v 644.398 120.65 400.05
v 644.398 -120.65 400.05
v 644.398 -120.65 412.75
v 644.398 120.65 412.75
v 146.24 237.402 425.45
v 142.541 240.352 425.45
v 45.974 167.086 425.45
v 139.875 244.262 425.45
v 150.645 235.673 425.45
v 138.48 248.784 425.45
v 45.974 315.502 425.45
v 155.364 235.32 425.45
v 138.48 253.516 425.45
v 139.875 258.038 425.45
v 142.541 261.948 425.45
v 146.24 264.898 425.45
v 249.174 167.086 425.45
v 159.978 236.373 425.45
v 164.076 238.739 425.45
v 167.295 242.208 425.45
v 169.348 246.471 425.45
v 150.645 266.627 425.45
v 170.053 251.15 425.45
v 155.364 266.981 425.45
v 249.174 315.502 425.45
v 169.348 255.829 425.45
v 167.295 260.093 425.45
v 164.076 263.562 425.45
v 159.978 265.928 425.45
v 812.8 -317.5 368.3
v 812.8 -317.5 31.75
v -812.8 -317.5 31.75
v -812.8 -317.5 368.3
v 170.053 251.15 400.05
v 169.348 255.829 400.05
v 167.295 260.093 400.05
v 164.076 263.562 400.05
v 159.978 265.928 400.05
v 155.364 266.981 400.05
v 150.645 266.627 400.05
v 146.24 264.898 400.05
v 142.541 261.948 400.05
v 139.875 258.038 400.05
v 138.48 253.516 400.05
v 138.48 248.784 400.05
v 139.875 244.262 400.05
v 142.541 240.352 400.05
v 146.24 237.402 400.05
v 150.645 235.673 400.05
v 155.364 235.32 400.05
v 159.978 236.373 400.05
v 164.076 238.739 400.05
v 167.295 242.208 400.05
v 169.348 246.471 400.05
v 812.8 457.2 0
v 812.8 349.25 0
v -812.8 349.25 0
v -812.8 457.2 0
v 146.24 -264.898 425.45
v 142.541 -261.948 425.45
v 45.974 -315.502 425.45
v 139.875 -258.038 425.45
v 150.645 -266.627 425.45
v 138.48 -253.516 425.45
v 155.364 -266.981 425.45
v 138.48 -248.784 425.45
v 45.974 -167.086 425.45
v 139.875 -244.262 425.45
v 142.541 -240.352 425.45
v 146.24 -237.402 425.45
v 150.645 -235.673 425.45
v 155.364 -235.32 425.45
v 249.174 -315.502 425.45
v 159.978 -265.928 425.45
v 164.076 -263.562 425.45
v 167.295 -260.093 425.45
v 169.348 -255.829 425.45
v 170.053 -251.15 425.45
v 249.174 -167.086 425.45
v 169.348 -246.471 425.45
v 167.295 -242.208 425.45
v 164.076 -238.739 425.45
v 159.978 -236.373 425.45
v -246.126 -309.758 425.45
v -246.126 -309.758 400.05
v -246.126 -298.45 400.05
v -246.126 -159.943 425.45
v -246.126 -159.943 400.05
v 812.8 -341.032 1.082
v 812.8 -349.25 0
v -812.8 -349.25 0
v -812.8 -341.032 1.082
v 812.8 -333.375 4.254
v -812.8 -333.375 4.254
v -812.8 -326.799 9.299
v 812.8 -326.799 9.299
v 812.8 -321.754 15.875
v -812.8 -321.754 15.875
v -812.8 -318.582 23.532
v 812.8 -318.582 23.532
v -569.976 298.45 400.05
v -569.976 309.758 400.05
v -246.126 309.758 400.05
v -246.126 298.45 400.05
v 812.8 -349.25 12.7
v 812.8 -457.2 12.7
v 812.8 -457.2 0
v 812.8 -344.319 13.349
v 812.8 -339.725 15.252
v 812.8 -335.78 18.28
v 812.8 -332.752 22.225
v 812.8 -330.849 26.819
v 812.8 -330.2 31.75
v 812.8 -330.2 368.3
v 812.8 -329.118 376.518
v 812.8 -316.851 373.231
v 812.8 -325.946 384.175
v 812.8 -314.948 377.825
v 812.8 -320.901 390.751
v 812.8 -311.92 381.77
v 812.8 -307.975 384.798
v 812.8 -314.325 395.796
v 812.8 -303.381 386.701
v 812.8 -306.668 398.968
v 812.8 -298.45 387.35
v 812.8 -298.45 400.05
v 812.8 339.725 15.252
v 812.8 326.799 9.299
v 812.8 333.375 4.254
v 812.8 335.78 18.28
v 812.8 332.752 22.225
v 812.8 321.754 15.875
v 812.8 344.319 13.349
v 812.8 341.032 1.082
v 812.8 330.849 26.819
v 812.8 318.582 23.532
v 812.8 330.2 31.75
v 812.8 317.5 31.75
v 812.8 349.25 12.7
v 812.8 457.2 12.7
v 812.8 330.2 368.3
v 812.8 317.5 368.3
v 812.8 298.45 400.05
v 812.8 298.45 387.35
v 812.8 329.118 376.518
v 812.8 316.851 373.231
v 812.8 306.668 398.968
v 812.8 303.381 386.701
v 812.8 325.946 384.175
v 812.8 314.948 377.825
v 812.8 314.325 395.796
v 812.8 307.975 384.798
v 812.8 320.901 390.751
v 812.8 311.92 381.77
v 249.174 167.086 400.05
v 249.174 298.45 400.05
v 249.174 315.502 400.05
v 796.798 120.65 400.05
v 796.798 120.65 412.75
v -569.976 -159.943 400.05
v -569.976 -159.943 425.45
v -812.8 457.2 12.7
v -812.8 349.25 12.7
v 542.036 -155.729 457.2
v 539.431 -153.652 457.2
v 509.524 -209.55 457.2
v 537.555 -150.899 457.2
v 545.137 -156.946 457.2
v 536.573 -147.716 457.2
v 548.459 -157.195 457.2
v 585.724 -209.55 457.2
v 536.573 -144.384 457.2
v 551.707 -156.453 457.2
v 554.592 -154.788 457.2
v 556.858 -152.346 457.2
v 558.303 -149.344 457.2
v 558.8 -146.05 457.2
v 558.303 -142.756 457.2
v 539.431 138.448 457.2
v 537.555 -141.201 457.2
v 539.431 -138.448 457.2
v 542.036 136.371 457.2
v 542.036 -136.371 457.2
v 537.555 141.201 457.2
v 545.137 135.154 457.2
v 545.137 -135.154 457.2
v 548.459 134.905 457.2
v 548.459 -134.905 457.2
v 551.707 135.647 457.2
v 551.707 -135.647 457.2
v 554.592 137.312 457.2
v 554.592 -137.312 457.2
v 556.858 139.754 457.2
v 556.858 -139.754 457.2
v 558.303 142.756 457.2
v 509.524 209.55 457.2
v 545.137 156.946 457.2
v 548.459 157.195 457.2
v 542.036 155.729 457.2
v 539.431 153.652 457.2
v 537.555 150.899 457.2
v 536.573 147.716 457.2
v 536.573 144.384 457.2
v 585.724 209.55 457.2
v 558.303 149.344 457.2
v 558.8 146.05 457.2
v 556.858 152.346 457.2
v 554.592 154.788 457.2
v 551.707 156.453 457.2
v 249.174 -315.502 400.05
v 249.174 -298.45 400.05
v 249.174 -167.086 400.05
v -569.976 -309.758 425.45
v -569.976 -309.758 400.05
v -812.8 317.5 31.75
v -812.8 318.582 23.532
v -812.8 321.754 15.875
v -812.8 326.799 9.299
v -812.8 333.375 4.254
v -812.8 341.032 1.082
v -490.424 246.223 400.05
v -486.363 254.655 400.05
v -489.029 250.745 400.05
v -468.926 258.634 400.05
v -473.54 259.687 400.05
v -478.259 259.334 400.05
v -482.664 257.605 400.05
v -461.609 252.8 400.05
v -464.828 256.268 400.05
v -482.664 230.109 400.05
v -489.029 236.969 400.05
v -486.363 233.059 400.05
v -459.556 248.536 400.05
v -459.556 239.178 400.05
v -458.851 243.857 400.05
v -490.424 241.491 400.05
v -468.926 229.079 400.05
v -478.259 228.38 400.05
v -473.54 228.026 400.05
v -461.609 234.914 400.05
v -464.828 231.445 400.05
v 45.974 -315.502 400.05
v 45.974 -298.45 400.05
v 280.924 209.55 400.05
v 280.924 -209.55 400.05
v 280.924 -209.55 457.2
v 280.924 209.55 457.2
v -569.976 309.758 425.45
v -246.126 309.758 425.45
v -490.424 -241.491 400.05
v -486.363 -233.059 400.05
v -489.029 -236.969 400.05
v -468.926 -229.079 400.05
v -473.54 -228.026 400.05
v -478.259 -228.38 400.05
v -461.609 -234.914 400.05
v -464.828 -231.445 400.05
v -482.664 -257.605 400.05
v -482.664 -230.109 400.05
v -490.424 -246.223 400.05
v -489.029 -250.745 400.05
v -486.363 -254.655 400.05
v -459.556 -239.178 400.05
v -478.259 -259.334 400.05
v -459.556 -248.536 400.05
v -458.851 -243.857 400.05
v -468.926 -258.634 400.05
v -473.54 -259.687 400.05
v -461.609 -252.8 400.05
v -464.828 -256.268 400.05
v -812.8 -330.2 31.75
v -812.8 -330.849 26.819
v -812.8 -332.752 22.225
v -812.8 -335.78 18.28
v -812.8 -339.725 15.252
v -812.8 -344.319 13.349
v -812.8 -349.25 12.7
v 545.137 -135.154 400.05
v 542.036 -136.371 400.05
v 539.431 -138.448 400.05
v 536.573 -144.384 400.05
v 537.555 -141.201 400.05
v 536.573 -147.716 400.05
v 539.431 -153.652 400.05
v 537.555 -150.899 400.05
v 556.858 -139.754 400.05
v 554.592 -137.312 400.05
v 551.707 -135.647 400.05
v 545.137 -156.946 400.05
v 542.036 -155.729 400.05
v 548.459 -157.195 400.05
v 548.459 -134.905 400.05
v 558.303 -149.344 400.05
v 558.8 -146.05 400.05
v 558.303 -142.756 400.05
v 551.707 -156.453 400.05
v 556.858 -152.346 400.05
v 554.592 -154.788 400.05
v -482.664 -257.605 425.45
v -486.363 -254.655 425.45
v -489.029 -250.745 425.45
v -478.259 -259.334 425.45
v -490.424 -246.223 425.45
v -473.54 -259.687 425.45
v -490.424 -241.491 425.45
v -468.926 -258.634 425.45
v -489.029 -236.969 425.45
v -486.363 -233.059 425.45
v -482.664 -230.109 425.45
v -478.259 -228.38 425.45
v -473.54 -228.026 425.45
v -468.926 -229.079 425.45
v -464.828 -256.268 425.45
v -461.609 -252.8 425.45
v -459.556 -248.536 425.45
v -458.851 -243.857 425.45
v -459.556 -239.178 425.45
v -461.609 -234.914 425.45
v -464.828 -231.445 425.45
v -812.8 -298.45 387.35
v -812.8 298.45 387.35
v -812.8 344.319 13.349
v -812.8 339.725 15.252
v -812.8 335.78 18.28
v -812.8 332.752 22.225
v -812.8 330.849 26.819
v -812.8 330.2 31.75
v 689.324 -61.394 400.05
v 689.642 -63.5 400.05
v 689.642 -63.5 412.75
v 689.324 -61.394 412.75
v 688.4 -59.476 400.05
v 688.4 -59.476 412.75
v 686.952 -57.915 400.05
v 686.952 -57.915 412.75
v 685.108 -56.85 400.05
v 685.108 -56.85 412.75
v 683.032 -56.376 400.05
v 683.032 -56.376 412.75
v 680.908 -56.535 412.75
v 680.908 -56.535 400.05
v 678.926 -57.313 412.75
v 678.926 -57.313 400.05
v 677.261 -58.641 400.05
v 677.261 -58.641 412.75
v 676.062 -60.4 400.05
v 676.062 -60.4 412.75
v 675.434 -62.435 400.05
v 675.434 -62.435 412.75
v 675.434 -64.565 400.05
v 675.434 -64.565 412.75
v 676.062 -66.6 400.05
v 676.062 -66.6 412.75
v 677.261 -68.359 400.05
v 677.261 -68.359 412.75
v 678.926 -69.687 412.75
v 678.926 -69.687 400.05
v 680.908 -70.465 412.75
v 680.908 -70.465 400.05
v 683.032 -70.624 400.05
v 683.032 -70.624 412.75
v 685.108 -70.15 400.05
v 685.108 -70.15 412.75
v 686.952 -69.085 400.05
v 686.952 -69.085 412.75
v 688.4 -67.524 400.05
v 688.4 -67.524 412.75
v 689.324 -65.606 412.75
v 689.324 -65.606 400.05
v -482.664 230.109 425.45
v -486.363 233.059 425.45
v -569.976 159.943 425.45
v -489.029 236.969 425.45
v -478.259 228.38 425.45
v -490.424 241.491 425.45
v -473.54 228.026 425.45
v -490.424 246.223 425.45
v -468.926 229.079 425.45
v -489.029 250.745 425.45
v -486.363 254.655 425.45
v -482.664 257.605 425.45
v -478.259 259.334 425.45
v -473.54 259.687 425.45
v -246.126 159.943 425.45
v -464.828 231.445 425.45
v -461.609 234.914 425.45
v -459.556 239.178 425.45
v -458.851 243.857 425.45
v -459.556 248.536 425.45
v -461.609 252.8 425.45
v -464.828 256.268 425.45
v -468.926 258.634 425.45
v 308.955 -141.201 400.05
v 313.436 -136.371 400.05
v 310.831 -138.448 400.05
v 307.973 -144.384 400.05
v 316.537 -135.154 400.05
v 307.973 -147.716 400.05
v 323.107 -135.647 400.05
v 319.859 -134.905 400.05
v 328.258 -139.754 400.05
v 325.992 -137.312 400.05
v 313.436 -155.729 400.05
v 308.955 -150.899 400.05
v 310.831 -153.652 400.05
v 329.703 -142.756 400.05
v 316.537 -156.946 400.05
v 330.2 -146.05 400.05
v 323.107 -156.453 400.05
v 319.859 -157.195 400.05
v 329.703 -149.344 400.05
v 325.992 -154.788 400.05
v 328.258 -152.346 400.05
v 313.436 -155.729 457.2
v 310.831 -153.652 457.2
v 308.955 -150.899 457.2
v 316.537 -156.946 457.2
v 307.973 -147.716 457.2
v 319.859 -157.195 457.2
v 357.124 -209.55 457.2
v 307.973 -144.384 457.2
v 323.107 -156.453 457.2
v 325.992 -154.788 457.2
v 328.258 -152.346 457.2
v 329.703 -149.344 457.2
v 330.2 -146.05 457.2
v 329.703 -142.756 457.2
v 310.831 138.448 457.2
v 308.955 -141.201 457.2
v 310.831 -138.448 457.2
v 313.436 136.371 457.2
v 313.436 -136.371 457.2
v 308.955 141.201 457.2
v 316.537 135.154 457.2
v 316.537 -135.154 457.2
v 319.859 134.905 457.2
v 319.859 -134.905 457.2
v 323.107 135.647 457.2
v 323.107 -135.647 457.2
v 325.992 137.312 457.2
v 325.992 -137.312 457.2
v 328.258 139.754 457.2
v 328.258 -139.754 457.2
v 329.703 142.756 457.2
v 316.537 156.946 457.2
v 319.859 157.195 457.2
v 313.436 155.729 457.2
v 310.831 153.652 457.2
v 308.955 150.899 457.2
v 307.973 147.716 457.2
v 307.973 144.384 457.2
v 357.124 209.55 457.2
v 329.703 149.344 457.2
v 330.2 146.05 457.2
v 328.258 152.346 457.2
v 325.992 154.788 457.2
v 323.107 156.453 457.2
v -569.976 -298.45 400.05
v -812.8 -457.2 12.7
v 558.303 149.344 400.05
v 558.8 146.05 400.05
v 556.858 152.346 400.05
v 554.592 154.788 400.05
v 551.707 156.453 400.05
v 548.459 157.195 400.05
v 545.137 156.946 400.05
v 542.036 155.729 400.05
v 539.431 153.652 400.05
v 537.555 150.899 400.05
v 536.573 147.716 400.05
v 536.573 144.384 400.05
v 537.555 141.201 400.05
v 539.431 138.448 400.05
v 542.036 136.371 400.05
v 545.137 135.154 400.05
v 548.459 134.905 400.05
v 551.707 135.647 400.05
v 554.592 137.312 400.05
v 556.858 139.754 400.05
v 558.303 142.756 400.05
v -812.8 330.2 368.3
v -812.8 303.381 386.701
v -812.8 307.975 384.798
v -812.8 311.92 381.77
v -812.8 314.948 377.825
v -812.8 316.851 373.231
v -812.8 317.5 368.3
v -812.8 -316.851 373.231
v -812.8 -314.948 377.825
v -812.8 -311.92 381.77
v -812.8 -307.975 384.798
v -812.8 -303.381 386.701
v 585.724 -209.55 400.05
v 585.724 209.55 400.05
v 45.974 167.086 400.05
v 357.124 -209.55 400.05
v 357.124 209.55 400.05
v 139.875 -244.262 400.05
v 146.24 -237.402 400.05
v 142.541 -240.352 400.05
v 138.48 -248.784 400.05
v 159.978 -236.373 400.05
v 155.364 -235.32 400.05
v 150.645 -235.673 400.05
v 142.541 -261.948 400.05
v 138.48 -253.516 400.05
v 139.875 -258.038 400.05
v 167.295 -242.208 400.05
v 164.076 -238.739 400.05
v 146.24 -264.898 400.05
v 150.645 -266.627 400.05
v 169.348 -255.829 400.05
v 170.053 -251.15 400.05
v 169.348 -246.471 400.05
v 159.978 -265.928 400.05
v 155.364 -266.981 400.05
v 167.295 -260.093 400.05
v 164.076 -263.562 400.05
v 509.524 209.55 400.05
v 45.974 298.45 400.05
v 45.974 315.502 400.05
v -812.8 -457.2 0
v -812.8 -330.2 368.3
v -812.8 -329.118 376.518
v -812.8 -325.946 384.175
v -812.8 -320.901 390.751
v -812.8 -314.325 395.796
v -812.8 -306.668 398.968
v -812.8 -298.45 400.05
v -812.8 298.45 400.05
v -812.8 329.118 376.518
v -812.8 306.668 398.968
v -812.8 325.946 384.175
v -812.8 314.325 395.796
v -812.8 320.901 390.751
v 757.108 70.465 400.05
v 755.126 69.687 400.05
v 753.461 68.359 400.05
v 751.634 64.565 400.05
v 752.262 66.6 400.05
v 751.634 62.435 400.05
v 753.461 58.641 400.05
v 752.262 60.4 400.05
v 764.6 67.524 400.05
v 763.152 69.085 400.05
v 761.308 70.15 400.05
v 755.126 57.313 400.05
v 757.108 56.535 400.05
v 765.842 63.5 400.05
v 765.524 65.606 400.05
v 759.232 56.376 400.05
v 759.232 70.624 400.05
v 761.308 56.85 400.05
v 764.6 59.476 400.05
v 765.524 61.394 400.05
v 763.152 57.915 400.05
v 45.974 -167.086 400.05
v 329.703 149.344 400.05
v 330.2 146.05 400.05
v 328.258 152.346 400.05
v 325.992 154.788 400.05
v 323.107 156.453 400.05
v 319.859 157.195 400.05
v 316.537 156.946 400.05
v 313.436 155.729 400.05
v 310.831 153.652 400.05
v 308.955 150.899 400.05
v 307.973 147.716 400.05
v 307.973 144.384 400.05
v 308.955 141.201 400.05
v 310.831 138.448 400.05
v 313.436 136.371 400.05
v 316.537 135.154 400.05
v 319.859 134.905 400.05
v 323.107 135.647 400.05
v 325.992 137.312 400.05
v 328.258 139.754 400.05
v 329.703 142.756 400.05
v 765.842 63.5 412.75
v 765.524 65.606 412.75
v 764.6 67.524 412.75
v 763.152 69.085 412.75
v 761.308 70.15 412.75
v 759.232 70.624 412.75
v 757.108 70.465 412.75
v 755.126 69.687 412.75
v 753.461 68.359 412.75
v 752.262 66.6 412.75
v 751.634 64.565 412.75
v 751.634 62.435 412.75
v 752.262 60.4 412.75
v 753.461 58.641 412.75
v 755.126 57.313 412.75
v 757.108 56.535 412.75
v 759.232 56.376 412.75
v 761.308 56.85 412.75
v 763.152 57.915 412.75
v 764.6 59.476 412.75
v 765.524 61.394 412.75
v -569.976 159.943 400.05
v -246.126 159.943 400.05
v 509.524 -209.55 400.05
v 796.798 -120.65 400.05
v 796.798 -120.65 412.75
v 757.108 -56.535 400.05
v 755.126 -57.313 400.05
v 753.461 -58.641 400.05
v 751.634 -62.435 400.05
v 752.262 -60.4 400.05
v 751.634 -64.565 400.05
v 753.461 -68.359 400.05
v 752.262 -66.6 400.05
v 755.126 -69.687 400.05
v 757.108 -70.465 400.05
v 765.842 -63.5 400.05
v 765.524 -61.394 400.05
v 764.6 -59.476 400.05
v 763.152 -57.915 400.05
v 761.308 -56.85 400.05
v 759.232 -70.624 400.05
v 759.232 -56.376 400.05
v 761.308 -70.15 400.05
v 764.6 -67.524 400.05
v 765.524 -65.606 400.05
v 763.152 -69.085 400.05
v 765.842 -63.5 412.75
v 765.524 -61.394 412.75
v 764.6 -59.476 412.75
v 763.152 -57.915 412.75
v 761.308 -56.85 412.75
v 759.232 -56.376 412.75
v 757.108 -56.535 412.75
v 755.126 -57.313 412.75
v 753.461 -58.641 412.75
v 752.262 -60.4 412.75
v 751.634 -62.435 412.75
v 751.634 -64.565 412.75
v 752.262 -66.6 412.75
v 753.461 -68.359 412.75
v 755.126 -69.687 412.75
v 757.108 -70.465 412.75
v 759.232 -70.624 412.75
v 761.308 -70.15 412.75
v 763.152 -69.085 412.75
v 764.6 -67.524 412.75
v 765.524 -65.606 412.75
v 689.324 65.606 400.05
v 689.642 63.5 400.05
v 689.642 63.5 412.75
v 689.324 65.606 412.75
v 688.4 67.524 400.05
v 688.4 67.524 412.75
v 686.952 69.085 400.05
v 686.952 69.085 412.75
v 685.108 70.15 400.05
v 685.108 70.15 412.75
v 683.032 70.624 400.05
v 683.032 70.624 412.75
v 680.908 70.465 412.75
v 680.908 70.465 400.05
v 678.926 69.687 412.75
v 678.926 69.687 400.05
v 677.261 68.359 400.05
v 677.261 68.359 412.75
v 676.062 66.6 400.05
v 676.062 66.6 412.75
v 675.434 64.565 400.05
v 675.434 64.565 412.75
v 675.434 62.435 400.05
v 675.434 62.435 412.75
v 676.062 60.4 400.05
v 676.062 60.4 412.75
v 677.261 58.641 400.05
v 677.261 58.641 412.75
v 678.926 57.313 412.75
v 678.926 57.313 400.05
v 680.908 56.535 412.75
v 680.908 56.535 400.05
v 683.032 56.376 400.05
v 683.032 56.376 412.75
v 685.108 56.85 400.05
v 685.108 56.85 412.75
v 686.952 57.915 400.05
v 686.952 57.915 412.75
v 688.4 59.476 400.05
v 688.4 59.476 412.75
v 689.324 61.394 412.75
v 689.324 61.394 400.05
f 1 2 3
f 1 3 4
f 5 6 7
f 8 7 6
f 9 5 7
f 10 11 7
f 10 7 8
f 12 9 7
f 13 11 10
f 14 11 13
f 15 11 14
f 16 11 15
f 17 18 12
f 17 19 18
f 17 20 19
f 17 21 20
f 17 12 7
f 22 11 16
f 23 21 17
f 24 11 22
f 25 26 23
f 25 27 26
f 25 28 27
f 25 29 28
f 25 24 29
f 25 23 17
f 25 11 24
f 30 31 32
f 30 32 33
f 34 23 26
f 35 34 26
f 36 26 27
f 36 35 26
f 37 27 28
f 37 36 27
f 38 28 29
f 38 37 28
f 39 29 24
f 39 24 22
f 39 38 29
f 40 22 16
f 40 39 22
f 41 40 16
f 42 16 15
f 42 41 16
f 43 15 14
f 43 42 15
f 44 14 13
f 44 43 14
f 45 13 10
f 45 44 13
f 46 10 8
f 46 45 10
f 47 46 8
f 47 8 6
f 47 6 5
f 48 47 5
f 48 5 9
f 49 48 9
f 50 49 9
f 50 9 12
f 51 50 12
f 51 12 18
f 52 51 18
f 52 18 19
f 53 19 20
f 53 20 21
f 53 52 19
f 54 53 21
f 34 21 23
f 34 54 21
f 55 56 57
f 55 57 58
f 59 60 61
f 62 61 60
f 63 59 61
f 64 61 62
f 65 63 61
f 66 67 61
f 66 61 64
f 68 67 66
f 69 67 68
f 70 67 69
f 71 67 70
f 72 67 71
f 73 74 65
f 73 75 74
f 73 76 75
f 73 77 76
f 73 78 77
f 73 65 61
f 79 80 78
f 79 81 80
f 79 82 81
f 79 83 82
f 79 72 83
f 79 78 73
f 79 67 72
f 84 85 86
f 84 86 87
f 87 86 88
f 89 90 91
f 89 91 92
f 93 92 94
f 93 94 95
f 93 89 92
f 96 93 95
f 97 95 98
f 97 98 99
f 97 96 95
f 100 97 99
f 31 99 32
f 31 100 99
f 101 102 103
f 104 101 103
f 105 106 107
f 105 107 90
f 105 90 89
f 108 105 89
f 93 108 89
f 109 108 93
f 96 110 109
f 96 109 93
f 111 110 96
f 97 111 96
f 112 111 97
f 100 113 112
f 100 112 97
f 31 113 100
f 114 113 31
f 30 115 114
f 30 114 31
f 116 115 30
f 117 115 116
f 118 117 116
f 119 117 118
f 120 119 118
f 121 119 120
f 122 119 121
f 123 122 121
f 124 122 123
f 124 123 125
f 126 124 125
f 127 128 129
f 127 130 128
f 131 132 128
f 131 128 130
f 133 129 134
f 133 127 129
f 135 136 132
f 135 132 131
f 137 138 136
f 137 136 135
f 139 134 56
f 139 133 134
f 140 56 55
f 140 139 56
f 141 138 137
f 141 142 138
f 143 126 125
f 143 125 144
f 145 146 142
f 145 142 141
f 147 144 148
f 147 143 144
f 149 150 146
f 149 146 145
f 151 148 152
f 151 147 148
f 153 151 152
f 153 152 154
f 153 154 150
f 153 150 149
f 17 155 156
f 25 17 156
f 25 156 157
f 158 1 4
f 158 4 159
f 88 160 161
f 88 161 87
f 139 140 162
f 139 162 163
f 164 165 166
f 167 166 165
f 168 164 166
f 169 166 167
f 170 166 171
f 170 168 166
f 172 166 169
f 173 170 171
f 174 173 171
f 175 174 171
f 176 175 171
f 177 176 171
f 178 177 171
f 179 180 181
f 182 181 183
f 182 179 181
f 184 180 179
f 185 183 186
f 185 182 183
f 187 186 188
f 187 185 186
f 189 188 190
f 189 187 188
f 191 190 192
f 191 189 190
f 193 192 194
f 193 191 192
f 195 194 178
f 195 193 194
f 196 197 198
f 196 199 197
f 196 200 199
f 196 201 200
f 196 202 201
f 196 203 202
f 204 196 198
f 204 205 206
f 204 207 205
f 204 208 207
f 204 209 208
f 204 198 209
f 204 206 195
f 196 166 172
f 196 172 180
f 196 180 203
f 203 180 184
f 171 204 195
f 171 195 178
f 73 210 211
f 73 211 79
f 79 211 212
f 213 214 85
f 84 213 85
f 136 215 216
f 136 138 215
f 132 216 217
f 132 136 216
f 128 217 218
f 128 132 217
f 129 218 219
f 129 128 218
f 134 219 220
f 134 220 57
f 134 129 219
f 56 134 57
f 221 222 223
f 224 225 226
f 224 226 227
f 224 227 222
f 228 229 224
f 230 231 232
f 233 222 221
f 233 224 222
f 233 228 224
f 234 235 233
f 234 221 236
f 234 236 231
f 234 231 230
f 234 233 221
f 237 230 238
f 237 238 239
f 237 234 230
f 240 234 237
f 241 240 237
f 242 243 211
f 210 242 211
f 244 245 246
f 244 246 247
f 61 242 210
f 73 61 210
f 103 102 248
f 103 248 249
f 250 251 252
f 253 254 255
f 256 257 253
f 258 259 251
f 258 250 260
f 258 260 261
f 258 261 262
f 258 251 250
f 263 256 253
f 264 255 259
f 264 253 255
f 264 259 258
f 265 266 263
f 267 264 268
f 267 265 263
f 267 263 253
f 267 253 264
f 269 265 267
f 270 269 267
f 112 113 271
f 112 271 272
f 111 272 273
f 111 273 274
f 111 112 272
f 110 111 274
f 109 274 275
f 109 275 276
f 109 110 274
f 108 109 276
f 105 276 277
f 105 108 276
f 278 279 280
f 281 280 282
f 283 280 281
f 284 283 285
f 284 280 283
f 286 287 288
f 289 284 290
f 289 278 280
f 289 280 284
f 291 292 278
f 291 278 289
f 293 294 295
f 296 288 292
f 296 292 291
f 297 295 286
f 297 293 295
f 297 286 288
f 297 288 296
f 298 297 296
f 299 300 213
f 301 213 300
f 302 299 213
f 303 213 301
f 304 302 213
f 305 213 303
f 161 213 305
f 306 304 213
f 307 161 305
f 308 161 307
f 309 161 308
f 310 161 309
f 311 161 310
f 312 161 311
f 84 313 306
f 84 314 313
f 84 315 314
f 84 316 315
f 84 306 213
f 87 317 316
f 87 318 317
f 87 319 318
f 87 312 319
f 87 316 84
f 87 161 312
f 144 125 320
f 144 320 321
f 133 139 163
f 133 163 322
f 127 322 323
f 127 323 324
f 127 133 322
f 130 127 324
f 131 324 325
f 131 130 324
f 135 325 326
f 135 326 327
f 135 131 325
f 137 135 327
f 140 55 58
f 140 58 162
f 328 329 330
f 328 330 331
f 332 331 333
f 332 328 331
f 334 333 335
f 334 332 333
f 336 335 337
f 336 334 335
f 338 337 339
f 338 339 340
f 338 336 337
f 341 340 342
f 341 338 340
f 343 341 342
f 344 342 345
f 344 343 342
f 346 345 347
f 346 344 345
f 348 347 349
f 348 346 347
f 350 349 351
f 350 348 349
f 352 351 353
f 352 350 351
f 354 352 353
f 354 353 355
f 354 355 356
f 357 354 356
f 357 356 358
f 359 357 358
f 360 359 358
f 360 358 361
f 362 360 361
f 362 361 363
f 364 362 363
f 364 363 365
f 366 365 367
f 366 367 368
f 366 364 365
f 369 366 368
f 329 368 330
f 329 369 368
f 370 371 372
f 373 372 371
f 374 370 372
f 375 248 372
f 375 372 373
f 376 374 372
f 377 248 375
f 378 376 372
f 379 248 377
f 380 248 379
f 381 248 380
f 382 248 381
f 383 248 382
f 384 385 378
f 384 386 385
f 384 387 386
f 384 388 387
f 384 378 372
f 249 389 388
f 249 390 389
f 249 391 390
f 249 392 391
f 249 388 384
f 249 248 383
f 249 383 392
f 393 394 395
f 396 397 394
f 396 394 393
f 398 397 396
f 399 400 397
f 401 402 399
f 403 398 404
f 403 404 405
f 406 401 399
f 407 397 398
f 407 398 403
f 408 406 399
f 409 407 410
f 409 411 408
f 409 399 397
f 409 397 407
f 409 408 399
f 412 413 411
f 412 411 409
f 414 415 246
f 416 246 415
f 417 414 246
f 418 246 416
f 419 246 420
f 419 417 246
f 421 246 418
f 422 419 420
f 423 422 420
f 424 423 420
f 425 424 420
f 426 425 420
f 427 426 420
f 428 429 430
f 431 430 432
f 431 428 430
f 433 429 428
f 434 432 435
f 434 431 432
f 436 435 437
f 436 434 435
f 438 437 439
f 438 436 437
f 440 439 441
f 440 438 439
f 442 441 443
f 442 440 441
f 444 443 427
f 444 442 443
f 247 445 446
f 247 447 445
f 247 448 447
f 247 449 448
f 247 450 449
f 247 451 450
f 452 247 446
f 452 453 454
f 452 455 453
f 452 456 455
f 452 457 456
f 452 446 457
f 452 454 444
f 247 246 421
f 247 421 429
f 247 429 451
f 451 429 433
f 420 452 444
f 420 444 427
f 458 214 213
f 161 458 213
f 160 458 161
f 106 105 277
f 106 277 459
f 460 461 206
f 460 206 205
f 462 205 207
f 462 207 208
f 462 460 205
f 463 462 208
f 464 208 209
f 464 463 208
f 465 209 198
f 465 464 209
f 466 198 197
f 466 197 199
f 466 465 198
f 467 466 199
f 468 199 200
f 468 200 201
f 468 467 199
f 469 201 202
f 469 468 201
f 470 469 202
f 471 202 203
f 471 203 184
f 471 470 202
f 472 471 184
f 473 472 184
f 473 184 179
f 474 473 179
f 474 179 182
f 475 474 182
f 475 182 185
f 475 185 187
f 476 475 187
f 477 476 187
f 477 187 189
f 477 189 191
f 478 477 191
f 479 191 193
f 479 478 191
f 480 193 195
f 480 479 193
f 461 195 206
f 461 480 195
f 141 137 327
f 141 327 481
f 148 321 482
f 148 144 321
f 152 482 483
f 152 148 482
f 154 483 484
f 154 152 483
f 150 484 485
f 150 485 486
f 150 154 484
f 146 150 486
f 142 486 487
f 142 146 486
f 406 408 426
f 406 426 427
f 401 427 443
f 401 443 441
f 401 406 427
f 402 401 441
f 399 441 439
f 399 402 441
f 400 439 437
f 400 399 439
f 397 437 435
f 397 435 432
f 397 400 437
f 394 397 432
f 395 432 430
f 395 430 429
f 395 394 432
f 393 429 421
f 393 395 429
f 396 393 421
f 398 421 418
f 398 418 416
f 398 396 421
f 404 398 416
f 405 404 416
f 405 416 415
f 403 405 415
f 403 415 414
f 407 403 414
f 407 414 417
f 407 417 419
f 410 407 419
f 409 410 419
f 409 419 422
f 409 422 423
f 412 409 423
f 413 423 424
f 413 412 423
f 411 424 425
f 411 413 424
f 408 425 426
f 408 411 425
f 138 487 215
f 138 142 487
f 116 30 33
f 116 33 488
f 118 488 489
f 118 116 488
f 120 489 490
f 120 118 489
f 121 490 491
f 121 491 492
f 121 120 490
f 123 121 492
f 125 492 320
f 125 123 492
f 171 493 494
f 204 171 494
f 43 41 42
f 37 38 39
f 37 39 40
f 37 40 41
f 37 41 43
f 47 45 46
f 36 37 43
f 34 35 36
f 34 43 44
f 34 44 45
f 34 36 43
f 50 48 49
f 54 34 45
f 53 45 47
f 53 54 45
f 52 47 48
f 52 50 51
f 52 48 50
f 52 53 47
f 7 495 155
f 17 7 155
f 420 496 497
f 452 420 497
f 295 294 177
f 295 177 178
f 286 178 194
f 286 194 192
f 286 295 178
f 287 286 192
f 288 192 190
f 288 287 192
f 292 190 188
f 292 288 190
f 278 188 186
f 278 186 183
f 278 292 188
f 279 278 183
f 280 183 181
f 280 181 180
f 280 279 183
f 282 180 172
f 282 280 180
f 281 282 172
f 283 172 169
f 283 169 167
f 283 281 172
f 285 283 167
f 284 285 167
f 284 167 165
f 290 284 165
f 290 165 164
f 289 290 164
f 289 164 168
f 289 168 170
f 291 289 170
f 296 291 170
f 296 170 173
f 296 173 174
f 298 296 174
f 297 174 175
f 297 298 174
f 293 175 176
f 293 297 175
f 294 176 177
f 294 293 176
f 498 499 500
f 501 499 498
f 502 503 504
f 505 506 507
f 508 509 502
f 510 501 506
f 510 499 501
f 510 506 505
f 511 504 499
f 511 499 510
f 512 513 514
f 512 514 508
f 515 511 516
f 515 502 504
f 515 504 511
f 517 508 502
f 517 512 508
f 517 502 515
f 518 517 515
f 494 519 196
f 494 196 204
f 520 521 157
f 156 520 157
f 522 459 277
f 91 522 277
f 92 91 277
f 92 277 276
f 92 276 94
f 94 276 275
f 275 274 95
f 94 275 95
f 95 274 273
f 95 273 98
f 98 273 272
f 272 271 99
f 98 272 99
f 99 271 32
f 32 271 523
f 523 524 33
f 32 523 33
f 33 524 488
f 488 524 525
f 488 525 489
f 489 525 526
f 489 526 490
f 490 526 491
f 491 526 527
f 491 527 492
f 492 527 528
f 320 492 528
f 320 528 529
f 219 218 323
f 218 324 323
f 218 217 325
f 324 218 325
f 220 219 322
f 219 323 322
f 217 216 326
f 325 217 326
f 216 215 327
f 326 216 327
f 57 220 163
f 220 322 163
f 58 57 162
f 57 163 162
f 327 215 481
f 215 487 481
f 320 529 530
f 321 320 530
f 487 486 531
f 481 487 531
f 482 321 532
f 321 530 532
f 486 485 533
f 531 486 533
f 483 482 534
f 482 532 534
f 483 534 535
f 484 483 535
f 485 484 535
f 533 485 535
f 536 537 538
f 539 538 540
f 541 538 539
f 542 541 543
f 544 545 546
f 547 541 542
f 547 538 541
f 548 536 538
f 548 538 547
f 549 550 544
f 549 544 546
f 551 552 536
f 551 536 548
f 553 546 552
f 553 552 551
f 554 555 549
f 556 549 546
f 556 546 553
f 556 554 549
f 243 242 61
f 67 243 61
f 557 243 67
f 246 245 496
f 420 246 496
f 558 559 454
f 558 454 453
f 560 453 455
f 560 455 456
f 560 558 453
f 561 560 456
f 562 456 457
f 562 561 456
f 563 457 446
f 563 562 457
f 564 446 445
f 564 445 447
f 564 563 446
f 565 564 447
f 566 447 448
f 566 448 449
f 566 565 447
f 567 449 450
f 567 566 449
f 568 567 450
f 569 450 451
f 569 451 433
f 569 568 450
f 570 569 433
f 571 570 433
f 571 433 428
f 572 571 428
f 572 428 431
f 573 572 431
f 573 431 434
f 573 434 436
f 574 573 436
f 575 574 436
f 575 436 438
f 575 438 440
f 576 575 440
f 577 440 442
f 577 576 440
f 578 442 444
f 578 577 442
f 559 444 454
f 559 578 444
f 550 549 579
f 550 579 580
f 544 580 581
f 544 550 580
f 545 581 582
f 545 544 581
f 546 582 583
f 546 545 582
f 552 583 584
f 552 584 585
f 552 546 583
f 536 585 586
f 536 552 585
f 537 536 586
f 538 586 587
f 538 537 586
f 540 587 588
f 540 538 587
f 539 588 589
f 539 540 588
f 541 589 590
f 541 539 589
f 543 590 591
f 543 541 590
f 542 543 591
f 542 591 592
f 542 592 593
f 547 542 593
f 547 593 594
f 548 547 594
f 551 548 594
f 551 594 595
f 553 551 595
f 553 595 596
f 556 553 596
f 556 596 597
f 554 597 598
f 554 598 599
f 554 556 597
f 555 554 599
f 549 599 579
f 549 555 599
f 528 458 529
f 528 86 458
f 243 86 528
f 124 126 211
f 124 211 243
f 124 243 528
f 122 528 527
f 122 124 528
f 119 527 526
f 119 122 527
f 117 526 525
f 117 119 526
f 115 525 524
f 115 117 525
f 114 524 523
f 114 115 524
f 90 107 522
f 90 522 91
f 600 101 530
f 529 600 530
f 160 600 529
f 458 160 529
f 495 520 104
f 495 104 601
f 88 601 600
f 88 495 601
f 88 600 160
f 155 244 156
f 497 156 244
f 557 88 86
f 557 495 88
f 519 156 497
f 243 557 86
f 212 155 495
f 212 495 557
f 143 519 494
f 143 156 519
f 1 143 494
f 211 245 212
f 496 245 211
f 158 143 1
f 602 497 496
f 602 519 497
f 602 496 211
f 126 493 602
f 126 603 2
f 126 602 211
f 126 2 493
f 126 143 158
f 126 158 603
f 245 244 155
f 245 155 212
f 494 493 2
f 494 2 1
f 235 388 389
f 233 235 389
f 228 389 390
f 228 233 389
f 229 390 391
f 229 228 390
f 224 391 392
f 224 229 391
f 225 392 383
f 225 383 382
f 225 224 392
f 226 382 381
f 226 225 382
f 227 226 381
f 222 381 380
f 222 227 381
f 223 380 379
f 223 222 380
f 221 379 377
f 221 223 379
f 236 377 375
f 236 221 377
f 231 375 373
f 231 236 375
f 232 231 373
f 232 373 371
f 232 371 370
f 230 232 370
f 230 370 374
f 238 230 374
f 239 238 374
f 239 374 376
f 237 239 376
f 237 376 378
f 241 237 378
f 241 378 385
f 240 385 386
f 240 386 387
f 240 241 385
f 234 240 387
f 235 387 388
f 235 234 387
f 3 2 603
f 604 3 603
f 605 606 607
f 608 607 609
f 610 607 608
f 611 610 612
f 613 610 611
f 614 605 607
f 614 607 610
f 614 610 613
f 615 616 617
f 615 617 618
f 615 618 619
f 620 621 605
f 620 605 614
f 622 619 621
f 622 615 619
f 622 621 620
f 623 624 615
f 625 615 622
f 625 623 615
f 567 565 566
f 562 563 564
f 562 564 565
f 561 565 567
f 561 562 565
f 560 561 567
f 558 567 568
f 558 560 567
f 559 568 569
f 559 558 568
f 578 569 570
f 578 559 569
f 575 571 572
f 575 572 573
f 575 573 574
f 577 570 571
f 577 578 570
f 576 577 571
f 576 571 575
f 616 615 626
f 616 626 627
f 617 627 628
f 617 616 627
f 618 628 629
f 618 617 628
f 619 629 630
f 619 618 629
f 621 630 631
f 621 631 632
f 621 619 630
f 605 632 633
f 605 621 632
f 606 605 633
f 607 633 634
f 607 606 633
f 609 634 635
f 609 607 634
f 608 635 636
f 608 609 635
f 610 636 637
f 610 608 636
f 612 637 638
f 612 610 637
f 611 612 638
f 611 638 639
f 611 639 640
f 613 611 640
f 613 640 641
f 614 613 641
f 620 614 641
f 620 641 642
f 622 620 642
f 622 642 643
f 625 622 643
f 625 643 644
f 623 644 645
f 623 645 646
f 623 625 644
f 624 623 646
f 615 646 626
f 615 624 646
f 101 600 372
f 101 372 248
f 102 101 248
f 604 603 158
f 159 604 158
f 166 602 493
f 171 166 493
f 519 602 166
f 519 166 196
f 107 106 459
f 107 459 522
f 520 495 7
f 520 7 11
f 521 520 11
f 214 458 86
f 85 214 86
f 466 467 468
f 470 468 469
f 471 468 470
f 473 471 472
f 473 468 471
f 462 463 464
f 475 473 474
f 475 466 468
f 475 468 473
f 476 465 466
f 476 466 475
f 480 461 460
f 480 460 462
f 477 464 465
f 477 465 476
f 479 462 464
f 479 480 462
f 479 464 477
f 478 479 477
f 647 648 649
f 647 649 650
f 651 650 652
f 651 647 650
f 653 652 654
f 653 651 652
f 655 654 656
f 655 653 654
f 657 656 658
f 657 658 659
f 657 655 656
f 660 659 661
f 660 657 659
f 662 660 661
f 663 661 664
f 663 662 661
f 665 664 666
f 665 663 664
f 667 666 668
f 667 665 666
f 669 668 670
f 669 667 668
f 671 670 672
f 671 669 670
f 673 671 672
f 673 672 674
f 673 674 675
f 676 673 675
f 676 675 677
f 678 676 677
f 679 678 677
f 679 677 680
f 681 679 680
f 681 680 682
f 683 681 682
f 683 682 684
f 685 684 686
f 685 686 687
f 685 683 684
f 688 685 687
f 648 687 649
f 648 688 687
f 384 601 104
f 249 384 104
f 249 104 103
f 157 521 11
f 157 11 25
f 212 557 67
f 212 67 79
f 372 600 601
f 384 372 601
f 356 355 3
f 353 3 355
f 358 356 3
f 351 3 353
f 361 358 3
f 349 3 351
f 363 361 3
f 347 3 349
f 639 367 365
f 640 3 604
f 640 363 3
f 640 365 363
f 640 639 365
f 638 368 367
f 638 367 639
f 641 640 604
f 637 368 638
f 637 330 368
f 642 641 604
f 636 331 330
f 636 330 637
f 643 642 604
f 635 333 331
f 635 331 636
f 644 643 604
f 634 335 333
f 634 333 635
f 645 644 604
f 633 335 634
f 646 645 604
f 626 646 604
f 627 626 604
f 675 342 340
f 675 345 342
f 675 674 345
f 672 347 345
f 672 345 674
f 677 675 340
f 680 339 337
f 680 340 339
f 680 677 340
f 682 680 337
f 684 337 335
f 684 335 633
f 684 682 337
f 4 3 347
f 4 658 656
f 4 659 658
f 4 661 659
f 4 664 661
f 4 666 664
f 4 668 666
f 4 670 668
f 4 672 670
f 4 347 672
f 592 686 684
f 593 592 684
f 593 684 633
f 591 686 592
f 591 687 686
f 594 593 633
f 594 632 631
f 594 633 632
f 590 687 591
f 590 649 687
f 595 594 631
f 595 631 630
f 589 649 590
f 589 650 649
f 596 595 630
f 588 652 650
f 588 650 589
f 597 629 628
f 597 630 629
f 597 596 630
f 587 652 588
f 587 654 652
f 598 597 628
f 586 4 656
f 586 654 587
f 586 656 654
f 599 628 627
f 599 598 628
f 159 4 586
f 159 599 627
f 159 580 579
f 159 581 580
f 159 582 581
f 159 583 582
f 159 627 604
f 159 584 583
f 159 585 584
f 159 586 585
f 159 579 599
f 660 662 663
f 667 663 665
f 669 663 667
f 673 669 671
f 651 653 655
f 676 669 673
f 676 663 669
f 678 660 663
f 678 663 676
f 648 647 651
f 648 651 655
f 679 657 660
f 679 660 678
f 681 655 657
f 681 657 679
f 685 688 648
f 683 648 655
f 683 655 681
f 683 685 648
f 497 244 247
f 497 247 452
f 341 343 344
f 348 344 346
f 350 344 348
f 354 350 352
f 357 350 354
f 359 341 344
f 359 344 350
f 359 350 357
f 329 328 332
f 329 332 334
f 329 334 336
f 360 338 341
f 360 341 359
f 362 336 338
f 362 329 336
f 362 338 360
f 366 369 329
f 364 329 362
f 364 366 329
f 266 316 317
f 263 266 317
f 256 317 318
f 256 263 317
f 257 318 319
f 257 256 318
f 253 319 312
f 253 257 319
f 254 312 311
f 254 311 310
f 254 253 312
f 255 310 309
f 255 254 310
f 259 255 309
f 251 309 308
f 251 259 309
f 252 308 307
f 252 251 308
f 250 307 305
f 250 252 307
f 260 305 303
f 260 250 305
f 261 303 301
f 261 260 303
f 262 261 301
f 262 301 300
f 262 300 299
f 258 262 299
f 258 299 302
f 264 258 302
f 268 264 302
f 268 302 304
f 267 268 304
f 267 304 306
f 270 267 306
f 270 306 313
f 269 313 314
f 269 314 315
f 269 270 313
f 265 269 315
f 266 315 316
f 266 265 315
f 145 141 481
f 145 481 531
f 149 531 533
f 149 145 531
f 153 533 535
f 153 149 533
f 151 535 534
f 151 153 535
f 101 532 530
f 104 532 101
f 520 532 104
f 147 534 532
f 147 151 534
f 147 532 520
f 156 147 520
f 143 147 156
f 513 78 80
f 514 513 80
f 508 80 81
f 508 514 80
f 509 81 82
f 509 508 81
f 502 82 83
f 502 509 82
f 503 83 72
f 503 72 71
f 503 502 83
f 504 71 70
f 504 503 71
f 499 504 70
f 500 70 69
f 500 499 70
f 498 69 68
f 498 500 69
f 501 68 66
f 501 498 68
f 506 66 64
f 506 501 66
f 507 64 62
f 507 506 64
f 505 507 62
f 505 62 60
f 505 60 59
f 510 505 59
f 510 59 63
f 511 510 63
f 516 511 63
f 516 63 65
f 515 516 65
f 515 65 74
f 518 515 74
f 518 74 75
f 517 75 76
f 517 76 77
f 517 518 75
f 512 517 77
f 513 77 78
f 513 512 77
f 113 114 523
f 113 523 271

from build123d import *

# Parameters (mm, degrees)
F1_DEPTH = 812.8
F2_W     = 323.85
F2_H     = 149.815533
F2_R     = 15.875
F2_W_2   = 203.2
F2_H_2   = 148.416346
F3_DEPTH = 25.4
F4_W     = 76.2
F4_H     = 419.1
F4_R     = 11.176
F5_DEPTH = 57.15
F6_W     = 152.4
F6_H     = 241.3
F6_R     = 7.14375
F7_DEPTH = 12.7


with BuildPart() as f1:
    # F0 (on Right) → F1 (new body, symmetric)
    with BuildSketch(Plane.YZ):
        with BuildLine():
            ThreePointArc((317.5, 31.75), (326.79936, 9.29936), (349.25, 0))
            Line((349.25, 0), (457.2, 0))
            Line((457.2, 0), (457.2, 12.7))
            Line((457.2, 12.7), (349.25, 12.7))
            ThreePointArc((349.25, 12.7), (335.779616, 18.279616), (330.2, 31.75))
            Line((330.2, 31.75), (330.2, 368.3))
            ThreePointArc((330.2, 368.3), (320.90064, 390.75064), (298.45, 400.05))
            Line((298.45, 400.05), (0, 400.05))
            Line((0, 400.05), (-298.45, 400.05))
            ThreePointArc((-298.45, 400.05), (-320.90064, 390.75064), (-330.2, 368.3))
            Line((-330.2, 368.3), (-330.2, 31.75))
            ThreePointArc((-330.2, 31.75), (-335.779616, 18.279616), (-349.25, 12.7))
            Line((-349.25, 12.7), (-457.2, 12.7))
            Line((-457.2, 12.7), (-457.2, 0))
            Line((-457.2, 0), (-349.25, 0))
            ThreePointArc((-349.25, 0), (-326.79936, 9.29936), (-317.5, 31.75))
            Line((-317.5, 31.75), (-317.5, 368.3))
            ThreePointArc((-317.5, 368.3), (-311.920384, 381.770384), (-298.45, 387.35))
            Line((-298.45, 387.35), (0, 387.35))
            Line((0, 387.35), (298.45, 387.35))
            ThreePointArc((298.45, 387.35), (311.920384, 381.770384), (317.5, 368.3))
            Line((317.5, 368.3), (317.5, 31.75))
        make_face()
    extrude(amount=F1_DEPTH, both=True)

    # F2 (on face) → F3 (join)
    with BuildSketch(Plane.XY.offset(400.05)):
        with Locations((-408.051, -234.850373)):
            Rectangle(F2_W, F2_H)
        with Locations((-474.726, -243.856796)):
            Circle(F2_R, mode=Mode.SUBTRACT)
        with Locations((147.574, -241.293997)):
            Rectangle(F2_W_2, F2_H_2)
        with Locations((154.178, -251.150241)):
            Circle(F2_R, mode=Mode.SUBTRACT)
        with Locations((-408.051, 234.850373)):
            Rectangle(F2_W, F2_H)
        with Locations((-474.726, 243.856796)):
            Circle(F2_R, mode=Mode.SUBTRACT)
        with Locations((147.574, 241.293997)):
            Rectangle(F2_W_2, F2_H_2)
        with Locations((154.178, 251.150241)):
            Circle(F2_R, mode=Mode.SUBTRACT)
    extrude(amount=F3_DEPTH)

    # F4 (on face) → F5 (join)
    with BuildSketch(Plane.XY.offset(400.05)):
        with Locations((547.624, 0)):
            Rectangle(F4_W, F4_H)
        with Locations((547.624, -146.05)):
            Circle(F4_R, mode=Mode.SUBTRACT)
        with Locations((547.624, 146.05)):
            Circle(F4_R, mode=Mode.SUBTRACT)
        with Locations((319.024, 0)):
            Rectangle(F4_W, F4_H)
        with Locations((319.024, -146.05)):
            Circle(F4_R, mode=Mode.SUBTRACT)
        with Locations((319.024, 146.05)):
            Circle(F4_R, mode=Mode.SUBTRACT)
    extrude(amount=F5_DEPTH)

    # F6 (on face) → F7 (join)
    with BuildSketch(Plane.XY.offset(400.05)):
        with Locations((720.598, 0)):
            Rectangle(F6_W, F6_H)
        with Locations((682.498, -63.5)):
            Circle(F6_R, mode=Mode.SUBTRACT)
        with Locations((758.698, -63.5)):
            Circle(F6_R, mode=Mode.SUBTRACT)
        with Locations((682.498, 63.5)):
            Circle(F6_R, mode=Mode.SUBTRACT)
        with Locations((758.698, 63.5)):
            Circle(F6_R, mode=Mode.SUBTRACT)
    extrude(amount=F7_DEPTH)


solid = f1.part
